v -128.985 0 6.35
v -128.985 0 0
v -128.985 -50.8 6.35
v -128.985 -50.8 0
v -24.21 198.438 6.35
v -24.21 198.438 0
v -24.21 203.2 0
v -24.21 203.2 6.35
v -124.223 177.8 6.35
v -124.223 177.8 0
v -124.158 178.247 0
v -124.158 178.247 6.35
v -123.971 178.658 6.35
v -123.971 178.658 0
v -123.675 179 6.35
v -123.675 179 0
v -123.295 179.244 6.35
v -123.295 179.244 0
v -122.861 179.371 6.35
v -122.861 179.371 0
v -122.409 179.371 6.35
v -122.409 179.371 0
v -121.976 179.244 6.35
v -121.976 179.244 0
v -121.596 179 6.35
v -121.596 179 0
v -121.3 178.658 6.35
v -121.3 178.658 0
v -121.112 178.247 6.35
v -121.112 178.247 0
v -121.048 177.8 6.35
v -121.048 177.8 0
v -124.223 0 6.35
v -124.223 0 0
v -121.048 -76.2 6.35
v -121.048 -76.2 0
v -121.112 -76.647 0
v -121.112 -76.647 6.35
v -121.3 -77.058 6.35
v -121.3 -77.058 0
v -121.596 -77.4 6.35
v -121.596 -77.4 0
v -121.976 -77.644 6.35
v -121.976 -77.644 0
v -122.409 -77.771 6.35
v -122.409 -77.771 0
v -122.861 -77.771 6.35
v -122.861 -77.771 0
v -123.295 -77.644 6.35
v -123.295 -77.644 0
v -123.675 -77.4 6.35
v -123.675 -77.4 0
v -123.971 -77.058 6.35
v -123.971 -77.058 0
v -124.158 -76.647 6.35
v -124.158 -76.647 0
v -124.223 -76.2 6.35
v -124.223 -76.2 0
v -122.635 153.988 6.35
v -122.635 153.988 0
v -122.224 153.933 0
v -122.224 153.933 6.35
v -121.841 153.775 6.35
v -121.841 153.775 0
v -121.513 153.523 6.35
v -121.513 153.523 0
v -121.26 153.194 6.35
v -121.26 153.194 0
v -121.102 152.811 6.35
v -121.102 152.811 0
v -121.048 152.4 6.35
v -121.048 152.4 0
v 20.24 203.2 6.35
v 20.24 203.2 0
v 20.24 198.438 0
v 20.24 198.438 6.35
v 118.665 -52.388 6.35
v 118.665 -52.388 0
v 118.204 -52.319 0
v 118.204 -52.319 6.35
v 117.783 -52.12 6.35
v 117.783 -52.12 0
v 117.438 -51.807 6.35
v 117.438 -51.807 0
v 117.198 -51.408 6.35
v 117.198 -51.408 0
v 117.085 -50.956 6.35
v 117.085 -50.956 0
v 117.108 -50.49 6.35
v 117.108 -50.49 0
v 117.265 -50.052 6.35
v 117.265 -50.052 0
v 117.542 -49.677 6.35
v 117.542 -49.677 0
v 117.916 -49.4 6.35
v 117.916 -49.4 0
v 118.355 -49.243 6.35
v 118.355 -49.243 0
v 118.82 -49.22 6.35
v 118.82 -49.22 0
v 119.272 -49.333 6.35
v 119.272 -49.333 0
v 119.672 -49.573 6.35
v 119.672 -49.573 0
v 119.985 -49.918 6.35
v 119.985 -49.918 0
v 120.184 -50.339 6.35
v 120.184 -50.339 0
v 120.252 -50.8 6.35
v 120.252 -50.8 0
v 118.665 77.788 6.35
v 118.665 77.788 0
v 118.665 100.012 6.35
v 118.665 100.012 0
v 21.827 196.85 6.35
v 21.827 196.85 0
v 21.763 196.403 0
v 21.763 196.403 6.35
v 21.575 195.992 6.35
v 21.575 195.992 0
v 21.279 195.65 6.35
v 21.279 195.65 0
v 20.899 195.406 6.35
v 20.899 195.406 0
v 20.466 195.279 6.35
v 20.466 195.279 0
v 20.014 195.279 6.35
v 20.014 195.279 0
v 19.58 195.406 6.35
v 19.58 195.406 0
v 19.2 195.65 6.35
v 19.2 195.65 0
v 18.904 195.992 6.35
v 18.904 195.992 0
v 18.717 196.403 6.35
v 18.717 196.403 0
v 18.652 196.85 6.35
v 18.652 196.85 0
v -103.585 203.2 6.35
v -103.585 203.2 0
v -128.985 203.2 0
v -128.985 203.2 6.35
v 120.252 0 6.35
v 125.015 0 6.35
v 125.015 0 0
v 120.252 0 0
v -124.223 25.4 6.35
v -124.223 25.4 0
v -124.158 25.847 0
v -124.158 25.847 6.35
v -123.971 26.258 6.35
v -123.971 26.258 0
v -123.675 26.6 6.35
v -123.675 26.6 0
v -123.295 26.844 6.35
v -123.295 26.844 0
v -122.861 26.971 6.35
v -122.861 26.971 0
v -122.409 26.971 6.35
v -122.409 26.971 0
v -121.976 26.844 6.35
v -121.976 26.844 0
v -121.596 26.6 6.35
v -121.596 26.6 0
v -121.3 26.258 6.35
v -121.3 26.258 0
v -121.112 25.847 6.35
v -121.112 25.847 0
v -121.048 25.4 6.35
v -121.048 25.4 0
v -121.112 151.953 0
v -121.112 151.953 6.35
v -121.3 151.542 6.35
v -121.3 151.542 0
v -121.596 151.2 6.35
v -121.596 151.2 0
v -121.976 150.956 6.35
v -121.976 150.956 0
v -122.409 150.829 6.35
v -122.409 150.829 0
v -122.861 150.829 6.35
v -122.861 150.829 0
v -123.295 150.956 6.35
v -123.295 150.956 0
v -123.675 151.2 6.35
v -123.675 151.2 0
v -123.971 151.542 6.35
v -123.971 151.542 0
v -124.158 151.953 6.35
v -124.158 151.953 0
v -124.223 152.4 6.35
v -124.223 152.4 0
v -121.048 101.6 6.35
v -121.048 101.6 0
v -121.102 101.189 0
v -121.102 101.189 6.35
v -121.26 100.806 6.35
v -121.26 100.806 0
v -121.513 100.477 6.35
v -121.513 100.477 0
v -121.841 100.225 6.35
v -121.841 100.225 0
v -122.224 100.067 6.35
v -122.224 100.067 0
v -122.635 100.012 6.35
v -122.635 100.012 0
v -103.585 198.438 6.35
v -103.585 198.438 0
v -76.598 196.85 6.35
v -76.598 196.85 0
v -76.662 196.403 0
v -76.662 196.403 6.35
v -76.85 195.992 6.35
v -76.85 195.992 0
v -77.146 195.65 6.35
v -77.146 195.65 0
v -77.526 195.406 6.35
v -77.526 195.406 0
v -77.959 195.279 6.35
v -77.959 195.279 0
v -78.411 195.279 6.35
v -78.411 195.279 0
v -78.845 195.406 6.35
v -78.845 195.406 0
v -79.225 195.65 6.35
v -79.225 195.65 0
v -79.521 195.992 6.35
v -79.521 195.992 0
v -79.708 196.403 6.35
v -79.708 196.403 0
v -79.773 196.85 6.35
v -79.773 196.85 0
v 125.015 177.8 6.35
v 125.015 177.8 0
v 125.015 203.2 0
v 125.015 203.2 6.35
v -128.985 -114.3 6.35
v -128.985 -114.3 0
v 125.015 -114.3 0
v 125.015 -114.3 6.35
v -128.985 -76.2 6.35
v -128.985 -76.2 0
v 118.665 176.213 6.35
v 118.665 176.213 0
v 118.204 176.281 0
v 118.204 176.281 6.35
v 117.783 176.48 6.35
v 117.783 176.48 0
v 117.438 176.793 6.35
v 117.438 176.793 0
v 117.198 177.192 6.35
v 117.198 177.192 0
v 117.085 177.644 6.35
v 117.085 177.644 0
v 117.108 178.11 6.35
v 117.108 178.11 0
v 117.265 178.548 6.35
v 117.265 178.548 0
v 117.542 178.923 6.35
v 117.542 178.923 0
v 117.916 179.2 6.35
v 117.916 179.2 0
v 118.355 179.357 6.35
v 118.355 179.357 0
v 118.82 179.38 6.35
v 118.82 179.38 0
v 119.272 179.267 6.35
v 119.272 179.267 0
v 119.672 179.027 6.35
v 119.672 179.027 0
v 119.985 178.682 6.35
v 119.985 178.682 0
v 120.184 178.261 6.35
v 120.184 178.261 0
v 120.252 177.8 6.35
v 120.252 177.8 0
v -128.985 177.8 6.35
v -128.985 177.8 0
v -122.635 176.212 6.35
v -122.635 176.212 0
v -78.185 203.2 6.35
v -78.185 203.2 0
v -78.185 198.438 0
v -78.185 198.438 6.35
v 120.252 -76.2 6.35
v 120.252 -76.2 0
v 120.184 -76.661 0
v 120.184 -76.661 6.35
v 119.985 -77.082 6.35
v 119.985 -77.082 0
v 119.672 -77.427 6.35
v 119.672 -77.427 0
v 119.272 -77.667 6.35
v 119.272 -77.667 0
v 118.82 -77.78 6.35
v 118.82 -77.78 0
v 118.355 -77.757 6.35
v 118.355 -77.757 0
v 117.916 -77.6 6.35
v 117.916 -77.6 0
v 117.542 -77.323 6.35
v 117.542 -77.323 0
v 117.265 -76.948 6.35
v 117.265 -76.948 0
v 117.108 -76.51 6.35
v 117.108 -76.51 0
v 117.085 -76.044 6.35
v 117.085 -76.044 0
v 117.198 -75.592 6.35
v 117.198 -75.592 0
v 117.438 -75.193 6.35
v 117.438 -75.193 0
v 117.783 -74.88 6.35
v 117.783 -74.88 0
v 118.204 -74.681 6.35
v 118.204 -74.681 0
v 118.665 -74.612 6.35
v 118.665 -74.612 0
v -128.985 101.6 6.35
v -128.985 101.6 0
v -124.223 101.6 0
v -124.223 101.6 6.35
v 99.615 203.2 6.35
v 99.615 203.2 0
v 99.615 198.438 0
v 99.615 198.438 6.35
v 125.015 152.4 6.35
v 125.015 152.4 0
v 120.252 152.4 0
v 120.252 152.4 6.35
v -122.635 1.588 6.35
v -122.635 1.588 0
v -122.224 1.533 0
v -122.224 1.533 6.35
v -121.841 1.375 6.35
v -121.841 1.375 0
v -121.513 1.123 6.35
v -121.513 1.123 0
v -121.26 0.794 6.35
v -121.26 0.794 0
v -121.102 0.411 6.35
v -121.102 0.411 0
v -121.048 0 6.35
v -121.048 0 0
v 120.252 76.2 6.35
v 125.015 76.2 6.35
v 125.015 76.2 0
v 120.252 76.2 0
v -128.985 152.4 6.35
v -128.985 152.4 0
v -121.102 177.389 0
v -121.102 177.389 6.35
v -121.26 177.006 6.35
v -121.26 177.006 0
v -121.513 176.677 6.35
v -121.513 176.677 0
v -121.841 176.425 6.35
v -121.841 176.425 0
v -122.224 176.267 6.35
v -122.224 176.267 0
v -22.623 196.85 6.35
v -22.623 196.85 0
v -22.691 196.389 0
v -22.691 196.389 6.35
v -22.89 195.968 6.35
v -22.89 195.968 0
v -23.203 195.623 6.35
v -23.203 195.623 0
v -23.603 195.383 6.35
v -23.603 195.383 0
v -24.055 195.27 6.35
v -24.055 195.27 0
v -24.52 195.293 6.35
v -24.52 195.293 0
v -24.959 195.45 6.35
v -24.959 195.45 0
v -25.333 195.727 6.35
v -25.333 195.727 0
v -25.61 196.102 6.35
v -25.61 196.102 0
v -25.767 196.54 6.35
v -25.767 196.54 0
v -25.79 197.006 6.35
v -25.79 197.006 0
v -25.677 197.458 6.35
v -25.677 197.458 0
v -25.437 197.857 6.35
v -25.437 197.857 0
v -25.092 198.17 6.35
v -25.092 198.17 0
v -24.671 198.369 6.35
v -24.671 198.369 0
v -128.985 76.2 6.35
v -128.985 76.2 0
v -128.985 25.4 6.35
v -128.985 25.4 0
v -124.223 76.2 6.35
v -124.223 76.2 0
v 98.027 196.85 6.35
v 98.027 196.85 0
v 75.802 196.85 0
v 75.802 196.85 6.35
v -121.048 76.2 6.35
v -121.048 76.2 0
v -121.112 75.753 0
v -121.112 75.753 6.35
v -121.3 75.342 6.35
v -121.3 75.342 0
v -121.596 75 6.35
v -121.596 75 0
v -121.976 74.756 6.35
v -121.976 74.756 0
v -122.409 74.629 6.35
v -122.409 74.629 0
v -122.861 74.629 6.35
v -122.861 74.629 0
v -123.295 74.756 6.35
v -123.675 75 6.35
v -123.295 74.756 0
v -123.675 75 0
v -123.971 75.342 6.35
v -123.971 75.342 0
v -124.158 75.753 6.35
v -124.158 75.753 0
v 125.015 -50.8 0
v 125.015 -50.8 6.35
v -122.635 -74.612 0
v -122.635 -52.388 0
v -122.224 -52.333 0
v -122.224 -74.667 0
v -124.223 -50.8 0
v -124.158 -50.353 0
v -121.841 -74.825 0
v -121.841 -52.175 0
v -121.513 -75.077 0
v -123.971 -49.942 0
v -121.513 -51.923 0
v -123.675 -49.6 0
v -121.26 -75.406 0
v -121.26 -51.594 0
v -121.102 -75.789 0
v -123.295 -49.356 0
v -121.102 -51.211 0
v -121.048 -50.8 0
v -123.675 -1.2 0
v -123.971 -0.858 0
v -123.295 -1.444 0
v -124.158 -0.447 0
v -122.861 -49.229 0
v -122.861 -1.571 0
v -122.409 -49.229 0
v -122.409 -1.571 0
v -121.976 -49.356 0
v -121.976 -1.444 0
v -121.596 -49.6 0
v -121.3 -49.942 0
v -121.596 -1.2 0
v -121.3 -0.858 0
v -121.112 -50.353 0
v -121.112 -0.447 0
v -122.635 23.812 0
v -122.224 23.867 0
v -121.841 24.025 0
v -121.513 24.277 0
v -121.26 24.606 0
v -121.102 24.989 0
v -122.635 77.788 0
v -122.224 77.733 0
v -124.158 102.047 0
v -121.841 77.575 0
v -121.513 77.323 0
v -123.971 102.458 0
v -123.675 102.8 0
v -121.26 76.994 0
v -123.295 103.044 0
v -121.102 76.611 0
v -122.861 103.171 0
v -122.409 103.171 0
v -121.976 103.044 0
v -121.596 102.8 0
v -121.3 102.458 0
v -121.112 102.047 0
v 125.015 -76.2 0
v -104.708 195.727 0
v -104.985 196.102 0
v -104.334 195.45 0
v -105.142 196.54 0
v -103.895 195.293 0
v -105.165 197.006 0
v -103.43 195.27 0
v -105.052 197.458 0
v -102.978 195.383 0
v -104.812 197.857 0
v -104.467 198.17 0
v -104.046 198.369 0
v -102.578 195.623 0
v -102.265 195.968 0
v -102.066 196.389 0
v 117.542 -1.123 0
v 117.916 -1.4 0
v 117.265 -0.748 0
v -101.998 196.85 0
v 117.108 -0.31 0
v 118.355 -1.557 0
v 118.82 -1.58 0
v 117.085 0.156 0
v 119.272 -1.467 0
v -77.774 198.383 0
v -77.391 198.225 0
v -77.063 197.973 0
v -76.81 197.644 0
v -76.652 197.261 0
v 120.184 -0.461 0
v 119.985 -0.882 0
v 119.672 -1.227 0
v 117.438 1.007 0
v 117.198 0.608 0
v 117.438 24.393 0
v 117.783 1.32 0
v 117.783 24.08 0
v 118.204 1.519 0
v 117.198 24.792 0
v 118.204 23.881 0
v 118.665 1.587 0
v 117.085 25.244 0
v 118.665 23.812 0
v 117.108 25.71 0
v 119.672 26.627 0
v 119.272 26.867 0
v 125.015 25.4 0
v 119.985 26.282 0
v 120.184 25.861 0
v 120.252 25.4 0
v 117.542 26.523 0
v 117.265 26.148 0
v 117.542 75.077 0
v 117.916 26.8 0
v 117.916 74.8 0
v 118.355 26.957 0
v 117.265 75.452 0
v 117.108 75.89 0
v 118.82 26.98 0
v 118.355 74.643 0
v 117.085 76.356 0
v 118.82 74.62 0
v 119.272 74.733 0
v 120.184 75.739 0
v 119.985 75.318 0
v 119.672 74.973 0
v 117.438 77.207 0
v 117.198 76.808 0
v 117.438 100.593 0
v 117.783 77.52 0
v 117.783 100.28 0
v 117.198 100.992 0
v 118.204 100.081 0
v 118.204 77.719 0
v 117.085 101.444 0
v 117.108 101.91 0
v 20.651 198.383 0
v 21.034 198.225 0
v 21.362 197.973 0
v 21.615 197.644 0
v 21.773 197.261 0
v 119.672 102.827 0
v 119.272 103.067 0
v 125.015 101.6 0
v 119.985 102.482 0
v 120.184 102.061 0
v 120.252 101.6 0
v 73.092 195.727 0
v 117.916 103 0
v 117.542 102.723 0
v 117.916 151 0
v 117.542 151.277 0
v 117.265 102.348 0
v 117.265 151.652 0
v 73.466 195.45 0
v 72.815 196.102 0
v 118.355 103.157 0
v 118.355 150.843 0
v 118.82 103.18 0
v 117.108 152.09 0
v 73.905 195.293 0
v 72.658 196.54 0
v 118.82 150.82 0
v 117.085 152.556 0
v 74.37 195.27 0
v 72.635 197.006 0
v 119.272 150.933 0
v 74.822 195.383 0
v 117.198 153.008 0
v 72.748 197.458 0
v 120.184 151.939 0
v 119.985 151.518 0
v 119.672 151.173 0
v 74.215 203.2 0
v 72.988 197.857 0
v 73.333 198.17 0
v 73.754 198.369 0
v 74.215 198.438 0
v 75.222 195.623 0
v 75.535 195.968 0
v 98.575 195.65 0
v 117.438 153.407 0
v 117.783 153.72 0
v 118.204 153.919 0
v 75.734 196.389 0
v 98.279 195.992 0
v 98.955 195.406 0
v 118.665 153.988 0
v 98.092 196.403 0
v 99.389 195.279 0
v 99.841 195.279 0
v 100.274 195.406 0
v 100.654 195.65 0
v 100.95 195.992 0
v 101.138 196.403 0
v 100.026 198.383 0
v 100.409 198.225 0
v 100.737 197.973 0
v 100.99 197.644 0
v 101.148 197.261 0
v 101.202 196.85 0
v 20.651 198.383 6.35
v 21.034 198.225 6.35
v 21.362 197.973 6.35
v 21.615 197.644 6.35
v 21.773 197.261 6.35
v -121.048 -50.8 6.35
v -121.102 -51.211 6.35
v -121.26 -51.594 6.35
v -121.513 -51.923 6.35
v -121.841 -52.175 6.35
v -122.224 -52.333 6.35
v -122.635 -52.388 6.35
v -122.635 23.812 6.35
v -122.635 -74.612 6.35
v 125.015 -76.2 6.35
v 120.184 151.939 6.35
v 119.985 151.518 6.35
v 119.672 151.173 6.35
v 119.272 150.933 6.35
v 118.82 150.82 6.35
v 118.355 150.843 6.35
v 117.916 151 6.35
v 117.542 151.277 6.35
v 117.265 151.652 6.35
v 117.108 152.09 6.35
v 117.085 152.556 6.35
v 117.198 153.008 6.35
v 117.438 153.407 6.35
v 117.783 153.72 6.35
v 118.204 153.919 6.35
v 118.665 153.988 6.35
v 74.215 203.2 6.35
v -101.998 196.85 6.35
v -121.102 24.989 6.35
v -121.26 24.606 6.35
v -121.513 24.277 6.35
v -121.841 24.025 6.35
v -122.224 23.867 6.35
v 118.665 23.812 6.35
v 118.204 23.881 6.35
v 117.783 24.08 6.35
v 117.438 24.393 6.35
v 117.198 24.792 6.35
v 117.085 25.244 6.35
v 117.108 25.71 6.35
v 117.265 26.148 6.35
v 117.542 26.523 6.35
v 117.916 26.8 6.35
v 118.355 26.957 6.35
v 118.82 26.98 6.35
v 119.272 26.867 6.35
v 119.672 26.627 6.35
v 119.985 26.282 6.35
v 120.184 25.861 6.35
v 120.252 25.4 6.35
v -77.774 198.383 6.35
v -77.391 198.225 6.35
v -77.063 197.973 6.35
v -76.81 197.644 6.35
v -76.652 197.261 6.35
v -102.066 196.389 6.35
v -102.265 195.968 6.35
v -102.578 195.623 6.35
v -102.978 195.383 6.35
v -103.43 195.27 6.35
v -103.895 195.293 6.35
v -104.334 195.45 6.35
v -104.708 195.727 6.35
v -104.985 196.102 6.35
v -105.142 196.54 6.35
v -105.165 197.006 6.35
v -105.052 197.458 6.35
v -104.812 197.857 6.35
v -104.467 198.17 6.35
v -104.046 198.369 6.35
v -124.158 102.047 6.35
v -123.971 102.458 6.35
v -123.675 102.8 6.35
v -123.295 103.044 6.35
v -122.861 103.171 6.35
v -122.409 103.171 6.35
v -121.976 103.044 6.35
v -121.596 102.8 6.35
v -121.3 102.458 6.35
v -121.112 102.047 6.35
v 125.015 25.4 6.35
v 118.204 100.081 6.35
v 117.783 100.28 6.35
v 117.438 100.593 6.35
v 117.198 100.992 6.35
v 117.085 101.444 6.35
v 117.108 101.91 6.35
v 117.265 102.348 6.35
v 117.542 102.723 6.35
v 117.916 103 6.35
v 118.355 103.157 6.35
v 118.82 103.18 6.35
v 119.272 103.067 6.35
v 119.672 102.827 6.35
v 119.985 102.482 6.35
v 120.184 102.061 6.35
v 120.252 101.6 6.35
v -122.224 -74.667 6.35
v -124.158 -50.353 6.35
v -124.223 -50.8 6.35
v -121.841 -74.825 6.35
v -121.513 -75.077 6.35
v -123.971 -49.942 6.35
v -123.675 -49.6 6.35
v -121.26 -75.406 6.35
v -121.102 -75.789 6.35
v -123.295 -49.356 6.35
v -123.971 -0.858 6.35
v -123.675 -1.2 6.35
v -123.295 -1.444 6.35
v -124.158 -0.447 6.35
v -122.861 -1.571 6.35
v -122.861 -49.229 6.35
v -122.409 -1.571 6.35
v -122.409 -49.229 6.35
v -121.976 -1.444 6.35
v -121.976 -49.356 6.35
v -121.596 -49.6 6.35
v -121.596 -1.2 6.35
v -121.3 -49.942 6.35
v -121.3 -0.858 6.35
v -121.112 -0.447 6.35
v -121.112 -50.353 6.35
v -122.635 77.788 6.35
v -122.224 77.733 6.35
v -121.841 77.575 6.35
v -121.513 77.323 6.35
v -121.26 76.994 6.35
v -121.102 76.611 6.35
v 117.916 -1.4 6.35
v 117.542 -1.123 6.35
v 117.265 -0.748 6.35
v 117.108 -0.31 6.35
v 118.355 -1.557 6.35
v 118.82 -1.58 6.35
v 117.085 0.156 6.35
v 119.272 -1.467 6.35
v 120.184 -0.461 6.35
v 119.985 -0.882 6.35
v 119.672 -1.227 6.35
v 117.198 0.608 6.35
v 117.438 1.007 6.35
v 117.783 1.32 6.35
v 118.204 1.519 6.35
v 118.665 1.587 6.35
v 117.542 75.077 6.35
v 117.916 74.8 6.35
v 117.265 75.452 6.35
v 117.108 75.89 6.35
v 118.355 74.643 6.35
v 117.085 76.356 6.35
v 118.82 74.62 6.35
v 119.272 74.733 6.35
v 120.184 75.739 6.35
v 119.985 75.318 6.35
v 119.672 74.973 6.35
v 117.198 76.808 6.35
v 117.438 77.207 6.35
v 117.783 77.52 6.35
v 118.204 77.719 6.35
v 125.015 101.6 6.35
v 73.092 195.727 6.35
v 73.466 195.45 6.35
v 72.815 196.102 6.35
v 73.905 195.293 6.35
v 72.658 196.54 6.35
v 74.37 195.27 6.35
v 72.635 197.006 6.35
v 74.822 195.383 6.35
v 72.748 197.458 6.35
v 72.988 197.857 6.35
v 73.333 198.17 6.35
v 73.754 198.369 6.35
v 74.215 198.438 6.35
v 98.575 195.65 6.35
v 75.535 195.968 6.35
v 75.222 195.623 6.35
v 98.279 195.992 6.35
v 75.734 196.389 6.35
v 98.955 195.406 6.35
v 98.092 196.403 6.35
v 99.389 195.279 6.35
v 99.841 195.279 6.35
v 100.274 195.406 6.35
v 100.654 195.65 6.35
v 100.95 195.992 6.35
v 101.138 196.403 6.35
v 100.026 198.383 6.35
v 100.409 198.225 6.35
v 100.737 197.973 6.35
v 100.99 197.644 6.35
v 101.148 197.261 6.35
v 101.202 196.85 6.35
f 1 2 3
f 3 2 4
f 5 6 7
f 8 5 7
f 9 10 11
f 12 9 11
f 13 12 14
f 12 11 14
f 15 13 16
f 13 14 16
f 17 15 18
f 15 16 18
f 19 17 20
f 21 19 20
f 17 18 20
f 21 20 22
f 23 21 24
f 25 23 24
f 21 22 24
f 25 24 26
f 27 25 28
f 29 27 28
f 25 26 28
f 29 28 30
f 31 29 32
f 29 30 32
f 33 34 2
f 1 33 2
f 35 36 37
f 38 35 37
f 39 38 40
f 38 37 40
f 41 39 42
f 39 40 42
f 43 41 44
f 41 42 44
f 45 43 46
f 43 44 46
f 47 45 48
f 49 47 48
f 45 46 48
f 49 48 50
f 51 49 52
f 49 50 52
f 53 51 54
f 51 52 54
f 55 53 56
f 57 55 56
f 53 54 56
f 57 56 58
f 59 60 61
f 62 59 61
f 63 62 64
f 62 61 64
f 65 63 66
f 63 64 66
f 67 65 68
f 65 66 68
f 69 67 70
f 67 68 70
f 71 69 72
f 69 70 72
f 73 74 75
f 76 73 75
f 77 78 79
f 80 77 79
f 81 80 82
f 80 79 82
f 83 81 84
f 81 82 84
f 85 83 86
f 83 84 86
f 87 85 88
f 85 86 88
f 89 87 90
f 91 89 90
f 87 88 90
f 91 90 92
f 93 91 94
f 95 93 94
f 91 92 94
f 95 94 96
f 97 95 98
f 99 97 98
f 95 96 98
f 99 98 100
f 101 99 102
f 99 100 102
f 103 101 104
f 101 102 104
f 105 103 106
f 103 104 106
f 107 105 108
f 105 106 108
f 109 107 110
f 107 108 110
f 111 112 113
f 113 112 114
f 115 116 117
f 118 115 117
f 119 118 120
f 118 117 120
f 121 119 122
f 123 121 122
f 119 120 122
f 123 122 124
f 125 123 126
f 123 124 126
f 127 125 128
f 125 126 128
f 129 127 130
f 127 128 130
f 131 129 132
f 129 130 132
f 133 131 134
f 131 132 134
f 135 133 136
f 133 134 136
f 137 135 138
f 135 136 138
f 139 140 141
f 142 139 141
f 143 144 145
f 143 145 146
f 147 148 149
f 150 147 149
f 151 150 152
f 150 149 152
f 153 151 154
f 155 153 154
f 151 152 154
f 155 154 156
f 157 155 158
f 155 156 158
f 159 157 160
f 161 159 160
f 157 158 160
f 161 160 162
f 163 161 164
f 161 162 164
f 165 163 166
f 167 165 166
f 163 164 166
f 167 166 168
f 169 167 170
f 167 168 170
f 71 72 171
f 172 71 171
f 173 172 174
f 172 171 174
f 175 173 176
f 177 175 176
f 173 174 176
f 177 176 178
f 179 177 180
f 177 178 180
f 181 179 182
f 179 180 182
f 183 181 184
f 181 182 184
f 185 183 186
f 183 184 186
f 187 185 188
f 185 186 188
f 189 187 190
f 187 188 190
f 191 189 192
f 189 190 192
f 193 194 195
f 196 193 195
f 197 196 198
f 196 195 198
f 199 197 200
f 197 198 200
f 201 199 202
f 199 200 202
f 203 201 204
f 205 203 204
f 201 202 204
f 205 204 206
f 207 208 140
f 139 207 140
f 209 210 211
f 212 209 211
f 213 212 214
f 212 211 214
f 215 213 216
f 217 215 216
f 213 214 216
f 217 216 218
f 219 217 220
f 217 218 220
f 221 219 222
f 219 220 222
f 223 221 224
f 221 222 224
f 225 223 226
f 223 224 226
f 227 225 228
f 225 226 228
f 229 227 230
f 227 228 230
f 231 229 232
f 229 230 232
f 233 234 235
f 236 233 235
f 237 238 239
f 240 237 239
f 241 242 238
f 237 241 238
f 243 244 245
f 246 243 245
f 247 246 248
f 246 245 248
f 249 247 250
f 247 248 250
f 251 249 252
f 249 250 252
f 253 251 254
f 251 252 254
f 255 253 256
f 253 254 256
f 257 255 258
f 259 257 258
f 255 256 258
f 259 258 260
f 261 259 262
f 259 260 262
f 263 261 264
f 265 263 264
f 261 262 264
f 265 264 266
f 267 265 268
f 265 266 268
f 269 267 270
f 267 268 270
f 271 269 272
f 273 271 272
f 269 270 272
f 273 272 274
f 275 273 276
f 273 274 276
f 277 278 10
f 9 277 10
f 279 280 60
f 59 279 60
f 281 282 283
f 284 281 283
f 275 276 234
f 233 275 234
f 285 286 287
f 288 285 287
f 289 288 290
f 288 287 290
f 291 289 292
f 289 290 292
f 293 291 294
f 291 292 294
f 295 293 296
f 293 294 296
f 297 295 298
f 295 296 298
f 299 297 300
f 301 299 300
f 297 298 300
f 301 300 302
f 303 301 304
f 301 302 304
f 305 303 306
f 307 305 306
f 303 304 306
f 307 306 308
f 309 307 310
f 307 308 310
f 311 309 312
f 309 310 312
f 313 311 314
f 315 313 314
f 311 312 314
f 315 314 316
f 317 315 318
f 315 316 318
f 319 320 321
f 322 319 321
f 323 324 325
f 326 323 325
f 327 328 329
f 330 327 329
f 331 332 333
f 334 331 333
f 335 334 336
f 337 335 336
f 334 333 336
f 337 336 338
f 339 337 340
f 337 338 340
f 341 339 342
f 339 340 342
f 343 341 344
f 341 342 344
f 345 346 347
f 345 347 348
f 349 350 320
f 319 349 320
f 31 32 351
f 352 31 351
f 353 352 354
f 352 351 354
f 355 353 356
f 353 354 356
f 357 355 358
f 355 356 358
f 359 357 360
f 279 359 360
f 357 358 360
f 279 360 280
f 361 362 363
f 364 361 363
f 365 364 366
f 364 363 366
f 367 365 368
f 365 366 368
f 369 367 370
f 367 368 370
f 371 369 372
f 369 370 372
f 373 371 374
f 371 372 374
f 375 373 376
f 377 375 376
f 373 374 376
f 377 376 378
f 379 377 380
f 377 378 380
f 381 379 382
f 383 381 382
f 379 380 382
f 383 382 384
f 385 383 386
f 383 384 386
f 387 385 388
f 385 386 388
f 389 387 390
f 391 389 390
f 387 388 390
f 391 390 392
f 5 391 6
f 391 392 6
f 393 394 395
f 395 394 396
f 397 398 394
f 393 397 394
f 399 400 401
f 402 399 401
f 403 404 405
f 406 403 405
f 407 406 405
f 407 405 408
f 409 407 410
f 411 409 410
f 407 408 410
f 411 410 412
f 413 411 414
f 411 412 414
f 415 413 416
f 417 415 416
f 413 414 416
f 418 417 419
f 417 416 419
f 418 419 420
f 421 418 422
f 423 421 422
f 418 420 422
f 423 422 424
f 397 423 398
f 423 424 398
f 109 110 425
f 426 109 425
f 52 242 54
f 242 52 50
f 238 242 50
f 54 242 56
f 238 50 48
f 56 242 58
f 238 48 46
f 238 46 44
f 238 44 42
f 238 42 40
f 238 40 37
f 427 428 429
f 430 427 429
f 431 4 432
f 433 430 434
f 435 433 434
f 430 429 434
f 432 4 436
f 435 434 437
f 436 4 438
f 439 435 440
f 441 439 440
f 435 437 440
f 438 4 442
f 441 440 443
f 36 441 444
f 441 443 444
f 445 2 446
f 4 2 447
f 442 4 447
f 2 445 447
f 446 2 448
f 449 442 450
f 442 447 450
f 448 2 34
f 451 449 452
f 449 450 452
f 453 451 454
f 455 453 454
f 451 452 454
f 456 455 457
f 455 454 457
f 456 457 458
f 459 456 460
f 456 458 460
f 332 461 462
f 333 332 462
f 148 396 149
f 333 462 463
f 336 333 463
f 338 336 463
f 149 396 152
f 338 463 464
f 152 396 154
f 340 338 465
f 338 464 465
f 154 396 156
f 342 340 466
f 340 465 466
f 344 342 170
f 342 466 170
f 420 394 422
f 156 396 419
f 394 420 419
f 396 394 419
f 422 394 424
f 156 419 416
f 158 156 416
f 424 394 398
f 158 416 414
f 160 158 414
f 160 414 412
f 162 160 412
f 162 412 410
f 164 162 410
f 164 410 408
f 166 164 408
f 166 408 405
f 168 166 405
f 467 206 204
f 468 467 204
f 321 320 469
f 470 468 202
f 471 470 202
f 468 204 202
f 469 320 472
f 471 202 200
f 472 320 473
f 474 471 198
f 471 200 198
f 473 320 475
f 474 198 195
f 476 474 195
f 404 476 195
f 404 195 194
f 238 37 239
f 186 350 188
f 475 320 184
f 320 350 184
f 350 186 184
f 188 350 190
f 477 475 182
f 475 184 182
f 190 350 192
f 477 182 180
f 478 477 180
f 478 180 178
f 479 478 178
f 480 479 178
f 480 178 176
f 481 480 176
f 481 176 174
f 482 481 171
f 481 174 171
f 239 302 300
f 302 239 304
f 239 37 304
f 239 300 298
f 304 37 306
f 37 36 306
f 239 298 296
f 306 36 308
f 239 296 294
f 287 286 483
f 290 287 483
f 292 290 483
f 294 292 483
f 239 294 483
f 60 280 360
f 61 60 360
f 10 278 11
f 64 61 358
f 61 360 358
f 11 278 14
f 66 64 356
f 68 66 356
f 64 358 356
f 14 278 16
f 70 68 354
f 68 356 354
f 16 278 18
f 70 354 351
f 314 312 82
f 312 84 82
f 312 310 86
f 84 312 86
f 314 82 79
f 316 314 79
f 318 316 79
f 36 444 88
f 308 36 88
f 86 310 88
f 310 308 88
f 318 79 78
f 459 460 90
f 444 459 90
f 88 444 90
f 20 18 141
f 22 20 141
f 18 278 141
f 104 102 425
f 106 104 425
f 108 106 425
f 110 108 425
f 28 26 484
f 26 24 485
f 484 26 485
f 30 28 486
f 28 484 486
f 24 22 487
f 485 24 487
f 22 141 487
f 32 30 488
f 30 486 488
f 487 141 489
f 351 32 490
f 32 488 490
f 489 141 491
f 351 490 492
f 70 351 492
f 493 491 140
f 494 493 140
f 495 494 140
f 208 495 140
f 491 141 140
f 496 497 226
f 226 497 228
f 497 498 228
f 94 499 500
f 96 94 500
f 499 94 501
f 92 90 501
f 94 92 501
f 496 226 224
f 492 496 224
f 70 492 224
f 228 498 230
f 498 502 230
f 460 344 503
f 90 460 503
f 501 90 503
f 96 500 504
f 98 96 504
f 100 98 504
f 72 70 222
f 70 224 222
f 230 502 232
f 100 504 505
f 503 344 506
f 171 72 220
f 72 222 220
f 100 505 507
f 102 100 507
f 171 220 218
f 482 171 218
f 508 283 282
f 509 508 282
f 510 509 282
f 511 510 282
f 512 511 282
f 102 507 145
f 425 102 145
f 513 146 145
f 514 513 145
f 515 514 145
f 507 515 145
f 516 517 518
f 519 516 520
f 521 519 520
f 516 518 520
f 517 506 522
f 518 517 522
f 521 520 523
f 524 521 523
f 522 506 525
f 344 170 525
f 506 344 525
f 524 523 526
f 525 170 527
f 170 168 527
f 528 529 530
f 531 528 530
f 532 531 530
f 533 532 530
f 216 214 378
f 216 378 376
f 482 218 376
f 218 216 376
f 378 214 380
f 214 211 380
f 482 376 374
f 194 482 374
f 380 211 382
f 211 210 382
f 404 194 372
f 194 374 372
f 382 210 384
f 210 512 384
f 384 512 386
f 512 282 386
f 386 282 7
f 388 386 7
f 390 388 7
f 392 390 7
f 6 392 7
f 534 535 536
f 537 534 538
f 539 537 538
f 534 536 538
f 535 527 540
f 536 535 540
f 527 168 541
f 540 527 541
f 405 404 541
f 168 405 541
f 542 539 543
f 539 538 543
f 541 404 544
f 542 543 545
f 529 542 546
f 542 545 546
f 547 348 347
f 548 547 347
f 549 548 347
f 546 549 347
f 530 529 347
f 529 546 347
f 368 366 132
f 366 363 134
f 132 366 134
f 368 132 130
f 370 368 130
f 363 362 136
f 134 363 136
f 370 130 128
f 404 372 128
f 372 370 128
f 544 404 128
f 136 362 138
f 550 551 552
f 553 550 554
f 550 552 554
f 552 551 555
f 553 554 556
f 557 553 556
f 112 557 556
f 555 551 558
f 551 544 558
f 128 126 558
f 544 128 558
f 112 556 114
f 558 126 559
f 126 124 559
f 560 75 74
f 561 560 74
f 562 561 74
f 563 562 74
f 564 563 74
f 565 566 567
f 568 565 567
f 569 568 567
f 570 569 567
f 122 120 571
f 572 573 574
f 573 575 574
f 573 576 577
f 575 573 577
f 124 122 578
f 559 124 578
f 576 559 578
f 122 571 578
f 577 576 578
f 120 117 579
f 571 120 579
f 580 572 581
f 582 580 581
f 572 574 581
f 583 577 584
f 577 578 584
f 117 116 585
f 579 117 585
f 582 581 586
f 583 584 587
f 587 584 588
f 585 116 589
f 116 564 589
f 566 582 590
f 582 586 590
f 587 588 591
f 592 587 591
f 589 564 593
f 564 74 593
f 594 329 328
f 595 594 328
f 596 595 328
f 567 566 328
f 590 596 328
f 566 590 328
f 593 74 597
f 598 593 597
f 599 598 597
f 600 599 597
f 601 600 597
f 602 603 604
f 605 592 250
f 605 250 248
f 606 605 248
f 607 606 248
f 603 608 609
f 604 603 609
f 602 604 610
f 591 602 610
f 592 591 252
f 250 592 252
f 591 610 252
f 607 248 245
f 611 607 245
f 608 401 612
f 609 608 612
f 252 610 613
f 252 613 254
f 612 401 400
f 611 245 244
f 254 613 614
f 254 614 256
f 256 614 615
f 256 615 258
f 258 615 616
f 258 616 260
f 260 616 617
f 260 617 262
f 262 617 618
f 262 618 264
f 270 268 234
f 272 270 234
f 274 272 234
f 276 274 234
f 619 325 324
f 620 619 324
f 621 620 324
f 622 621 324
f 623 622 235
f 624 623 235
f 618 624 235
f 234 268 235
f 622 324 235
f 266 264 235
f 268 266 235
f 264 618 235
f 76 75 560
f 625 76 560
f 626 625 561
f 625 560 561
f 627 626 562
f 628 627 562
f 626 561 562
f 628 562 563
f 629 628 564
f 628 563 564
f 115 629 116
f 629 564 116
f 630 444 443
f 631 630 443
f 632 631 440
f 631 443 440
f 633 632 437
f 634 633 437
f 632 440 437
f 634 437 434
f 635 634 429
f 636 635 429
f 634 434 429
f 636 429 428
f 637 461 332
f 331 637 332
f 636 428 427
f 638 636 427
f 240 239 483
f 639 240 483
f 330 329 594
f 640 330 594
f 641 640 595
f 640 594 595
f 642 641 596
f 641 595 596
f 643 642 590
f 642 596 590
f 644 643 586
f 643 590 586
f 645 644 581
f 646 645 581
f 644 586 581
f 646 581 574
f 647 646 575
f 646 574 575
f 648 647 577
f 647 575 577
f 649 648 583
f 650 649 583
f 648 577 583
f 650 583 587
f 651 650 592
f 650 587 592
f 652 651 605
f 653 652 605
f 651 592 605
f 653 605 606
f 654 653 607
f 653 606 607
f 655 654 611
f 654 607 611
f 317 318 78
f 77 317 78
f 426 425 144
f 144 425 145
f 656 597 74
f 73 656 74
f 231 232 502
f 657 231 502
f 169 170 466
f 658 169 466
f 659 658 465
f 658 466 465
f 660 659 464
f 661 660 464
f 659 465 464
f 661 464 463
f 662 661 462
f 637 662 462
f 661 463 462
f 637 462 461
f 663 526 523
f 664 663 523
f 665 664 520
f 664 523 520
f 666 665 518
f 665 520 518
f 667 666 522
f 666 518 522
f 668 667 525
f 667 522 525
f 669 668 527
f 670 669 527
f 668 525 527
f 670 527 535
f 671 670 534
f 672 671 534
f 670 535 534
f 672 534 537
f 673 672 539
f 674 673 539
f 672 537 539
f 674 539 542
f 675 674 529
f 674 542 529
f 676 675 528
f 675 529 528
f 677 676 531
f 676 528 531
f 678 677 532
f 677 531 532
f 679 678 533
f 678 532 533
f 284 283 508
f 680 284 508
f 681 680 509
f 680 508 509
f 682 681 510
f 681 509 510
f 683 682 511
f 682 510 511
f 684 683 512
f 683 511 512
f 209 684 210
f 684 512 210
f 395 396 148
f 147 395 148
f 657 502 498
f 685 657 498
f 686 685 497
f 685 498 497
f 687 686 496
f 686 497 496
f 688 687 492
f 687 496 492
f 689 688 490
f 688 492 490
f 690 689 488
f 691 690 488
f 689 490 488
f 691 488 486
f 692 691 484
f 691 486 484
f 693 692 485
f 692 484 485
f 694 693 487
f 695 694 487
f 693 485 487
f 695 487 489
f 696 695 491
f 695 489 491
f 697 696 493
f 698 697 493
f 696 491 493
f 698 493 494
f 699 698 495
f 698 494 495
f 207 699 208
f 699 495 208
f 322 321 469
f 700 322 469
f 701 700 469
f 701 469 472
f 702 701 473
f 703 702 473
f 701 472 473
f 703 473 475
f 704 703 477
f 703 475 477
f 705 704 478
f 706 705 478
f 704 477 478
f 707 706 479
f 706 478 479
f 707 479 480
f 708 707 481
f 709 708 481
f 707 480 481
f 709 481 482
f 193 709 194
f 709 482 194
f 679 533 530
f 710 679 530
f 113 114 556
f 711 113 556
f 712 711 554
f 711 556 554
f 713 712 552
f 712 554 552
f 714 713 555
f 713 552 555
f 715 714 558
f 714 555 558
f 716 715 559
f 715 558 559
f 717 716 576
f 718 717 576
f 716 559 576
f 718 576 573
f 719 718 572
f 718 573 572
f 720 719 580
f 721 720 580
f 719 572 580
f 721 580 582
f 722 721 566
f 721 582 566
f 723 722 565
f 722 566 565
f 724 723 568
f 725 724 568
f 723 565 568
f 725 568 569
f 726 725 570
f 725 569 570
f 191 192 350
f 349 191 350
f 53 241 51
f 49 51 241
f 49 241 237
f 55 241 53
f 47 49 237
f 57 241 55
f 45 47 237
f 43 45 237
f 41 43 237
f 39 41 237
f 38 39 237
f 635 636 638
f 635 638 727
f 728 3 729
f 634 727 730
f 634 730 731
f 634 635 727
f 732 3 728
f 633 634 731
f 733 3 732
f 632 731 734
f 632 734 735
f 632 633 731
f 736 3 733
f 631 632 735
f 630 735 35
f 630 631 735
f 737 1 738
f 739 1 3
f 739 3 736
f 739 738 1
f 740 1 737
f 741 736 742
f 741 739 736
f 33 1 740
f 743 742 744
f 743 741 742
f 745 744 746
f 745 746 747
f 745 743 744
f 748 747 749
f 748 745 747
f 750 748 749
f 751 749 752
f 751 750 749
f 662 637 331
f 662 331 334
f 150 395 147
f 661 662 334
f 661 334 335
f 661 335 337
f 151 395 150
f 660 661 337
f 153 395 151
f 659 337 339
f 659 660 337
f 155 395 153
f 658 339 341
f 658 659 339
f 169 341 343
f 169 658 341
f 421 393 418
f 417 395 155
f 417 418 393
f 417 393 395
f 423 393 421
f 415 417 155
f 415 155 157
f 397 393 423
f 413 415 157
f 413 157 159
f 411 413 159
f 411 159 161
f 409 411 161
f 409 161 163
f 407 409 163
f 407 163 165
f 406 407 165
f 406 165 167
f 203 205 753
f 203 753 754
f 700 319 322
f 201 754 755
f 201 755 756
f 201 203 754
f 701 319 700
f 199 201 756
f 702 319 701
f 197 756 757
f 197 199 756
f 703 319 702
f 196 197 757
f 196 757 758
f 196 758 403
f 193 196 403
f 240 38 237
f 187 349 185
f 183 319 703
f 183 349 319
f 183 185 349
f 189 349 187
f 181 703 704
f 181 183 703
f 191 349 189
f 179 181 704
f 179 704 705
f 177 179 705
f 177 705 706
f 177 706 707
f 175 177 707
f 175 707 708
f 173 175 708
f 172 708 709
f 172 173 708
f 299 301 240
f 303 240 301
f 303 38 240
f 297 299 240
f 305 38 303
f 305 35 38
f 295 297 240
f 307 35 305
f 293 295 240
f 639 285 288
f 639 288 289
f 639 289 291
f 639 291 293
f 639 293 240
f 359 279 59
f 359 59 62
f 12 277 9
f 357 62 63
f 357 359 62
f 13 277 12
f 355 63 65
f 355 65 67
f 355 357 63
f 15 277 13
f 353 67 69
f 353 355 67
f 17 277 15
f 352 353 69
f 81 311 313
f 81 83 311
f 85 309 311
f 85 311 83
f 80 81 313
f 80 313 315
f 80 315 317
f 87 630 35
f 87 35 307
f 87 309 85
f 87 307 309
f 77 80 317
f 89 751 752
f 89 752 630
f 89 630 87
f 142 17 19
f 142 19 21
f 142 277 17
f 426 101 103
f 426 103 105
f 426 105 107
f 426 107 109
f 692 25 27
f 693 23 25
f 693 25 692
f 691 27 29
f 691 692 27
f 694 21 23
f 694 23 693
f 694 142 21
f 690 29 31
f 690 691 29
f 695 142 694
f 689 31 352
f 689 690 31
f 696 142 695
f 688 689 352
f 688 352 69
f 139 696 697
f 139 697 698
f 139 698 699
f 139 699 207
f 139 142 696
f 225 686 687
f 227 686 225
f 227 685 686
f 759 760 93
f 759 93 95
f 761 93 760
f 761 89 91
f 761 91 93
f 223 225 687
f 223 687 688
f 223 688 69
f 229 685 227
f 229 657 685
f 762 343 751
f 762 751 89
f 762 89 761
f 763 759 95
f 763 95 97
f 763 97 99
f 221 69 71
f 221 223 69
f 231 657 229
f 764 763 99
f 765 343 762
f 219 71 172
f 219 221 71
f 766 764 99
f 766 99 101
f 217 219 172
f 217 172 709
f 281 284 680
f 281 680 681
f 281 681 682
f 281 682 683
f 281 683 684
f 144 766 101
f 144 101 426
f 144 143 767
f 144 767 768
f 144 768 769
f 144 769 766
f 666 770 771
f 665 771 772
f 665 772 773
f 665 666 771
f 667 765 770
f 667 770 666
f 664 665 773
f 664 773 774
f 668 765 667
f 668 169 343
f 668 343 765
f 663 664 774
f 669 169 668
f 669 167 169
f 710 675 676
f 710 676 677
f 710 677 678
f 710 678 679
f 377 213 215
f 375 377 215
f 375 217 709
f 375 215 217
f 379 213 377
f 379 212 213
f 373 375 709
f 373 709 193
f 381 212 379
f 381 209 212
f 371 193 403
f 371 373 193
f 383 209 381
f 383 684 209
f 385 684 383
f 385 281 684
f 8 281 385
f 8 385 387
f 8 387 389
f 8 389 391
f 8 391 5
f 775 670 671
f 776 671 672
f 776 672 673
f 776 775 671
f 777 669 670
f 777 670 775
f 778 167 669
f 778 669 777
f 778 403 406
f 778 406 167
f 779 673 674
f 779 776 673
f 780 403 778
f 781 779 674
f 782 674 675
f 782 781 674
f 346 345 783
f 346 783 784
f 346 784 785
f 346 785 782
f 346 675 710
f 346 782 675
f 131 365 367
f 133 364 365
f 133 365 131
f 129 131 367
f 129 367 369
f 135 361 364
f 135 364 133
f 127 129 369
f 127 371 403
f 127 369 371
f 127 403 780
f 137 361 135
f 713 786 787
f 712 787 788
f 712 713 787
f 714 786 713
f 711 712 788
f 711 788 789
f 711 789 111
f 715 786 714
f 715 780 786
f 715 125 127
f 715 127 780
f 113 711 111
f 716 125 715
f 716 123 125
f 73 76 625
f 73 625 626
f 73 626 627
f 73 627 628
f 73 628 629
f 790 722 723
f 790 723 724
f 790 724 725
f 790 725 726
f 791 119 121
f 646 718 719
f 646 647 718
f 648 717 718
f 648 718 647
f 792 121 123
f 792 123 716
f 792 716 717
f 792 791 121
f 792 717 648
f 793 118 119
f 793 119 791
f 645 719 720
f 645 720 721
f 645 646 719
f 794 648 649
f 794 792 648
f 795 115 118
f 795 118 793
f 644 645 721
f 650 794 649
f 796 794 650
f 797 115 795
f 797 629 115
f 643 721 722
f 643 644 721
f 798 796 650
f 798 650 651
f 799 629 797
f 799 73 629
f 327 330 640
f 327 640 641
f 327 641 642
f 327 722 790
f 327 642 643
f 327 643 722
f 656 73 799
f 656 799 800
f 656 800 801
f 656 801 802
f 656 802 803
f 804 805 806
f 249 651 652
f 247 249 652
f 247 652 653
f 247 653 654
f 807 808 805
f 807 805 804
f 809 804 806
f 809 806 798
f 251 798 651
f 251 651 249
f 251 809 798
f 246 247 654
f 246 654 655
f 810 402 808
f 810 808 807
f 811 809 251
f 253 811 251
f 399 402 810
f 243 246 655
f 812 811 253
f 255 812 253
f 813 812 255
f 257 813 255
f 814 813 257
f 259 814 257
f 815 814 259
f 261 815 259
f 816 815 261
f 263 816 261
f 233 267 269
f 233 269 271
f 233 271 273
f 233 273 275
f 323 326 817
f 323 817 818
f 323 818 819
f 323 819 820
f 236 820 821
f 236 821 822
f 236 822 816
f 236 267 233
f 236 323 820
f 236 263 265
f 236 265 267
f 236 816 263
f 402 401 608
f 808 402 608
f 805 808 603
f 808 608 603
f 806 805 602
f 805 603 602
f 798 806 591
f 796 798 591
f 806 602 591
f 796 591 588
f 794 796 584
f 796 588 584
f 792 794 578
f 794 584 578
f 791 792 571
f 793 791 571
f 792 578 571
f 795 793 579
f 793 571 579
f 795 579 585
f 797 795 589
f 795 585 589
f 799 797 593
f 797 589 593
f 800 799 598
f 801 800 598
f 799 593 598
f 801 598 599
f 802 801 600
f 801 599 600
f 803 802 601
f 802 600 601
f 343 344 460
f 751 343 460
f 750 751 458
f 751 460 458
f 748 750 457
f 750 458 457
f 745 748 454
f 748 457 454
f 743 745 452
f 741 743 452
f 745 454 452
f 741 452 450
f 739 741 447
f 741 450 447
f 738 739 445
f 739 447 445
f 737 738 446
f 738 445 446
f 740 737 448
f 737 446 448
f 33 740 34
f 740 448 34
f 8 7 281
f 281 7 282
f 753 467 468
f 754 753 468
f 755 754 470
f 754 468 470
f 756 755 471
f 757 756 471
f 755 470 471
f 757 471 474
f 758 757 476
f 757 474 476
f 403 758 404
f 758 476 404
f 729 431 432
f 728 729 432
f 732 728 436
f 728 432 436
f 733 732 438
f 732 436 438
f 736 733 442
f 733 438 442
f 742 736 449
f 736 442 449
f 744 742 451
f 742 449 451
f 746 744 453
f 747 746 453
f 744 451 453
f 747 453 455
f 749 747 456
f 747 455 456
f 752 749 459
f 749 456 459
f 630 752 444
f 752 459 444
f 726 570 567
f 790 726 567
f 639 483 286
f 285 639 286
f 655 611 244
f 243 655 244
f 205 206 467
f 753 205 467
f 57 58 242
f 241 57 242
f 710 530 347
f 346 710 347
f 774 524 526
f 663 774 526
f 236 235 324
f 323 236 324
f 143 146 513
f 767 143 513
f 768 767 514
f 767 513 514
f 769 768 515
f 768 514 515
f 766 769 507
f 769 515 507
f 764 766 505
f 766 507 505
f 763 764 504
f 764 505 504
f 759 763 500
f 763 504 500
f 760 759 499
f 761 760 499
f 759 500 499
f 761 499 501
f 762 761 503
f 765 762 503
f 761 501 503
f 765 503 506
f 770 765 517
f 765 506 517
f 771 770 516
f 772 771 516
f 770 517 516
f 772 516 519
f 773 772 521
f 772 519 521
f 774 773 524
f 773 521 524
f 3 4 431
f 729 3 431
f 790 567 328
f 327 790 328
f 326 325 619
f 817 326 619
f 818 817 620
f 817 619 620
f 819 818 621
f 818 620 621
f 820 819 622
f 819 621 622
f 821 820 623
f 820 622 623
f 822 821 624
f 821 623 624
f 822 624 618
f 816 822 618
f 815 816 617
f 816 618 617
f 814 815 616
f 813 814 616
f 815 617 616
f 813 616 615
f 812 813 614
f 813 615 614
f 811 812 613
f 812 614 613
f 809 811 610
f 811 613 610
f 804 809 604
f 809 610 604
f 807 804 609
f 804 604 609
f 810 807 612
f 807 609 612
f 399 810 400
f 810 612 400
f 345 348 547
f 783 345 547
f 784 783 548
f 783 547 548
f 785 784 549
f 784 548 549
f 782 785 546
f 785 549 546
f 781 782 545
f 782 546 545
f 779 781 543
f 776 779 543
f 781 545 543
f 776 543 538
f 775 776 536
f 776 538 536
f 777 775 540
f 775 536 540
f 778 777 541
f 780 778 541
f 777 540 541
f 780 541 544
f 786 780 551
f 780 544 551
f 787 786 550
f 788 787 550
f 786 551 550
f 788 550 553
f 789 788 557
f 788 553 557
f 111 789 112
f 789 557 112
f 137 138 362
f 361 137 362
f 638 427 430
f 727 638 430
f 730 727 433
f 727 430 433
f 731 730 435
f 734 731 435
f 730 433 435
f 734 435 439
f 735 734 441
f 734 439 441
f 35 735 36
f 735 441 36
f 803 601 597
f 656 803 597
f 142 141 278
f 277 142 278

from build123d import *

# Parameters (mm, degrees)
F1_DEPTH = 6.35


with BuildPart() as f1:
    # F0 (on Top) → F1 (new body)
    with BuildSketch(Plane.XY):
        with BuildLine():
            Line((-103.585208, 203.2), (-128.985208, 203.2))
            Line((-128.985208, 203.2), (-128.985208, 177.8))
            Line((-128.985208, 177.8), (-124.222708, 177.8))
            ThreePointArc((-124.222708, 177.8), (-122.635208, 179.3875), (-121.047708, 177.8))
            ThreePointArc((-121.047708, 177.8), (-121.512676, 176.677468), (-122.635208, 176.2125))
            Line((-122.635208, 176.2125), (-122.635208, 153.9875))
            ThreePointArc((-122.635208, 153.9875), (-121.512676, 153.522532), (-121.047708, 152.4))
            ThreePointArc((-121.047708, 152.4), (-122.635208, 150.8125), (-124.222708, 152.4))
            Line((-124.222708, 152.4), (-128.985208, 152.4))
            Line((-128.985208, 152.4), (-128.985208, 101.6))
            Line((-128.985208, 101.6), (-124.222708, 101.6))
            ThreePointArc((-124.222708, 101.6), (-122.635208, 103.1875), (-121.047708, 101.6))
            ThreePointArc((-121.047708, 101.6), (-121.512676, 100.477468), (-122.635208, 100.0125))
            Line((-122.635208, 100.0125), (-122.635208, 77.7875))
            ThreePointArc((-122.635208, 77.7875), (-121.512676, 77.322532), (-121.047708, 76.2))
            ThreePointArc((-121.047708, 76.2), (-122.635208, 74.6125), (-124.222708, 76.2))
            Line((-124.222708, 76.2), (-128.985208, 76.2))
            Line((-128.985208, 76.2), (-128.985208, 25.4))
            Line((-128.985208, 25.4), (-124.222708, 25.4))
            ThreePointArc((-124.222708, 25.4), (-122.635208, 26.9875), (-121.047708, 25.4))
            ThreePointArc((-121.047708, 25.4), (-121.512676, 24.277468), (-122.635208, 23.8125))
            Line((-122.635208, 23.8125), (-122.635208, 1.5875))
            ThreePointArc((-122.635208, 1.5875), (-121.512676, 1.122532), (-121.047708, 0))
            ThreePointArc((-121.047708, 0), (-122.635208, -1.5875), (-124.222708, 0))
            Line((-124.222708, 0), (-128.985208, 0))
            Line((-128.985208, 0), (-128.985208, -50.8))
            Line((-128.985208, -50.8), (-124.222708, -50.8))
            ThreePointArc((-124.222708, -50.8), (-122.635208, -49.2125), (-121.047708, -50.8))
            ThreePointArc((-121.047708, -50.8), (-121.512676, -51.922532), (-122.635208, -52.3875))
            Line((-122.635208, -52.3875), (-122.635208, -74.6125))
            ThreePointArc((-122.635208, -74.6125), (-121.512676, -75.077468), (-121.047708, -76.2))
            ThreePointArc((-121.047708, -76.2), (-122.635208, -77.7875), (-124.222708, -76.2))
            Line((-124.222708, -76.2), (-128.985208, -76.2))
            Line((-128.985208, -76.2), (-128.985208, -114.3))
            Line((-128.985208, -114.3), (125.014792, -114.3))
            Line((125.014792, -114.3), (125.014792, -76.2))
            Line((125.014792, -76.2), (120.252292, -76.2))
            ThreePointArc((120.252292, -76.2), (117.54226, -77.322532), (118.664792, -74.6125))
            Line((118.664792, -74.6125), (118.664792, -52.3875))
            ThreePointArc((118.664792, -52.3875), (117.54226, -49.677468), (120.252292, -50.8))
            Line((120.252292, -50.8), (125.014792, -50.8))
            Line((125.014792, -50.8), (125.014792, 0))
            Line((125.014792, 0), (120.252292, 0))
            ThreePointArc((120.252292, 0), (117.54226, -1.122532), (118.664792, 1.5875))
            Line((118.664792, 1.5875), (118.664792, 23.8125))
            ThreePointArc((118.664792, 23.8125), (117.54226, 26.522532), (120.252292, 25.4))
            Line((120.252292, 25.4), (125.014792, 25.4))
            Line((125.014792, 25.4), (125.014792, 76.2))
            Line((125.014792, 76.2), (120.252292, 76.2))
            ThreePointArc((120.252292, 76.2), (117.54226, 75.077468), (118.664792, 77.7875))
            Line((118.664792, 77.7875), (118.664792, 100.0125))
            ThreePointArc((118.664792, 100.0125), (117.54226, 102.722532), (120.252292, 101.6))
            Line((120.252292, 101.6), (125.014792, 101.6))
            Line((125.014792, 101.6), (125.014792, 152.4))
            Line((125.014792, 152.4), (120.252292, 152.4))
            ThreePointArc((120.252292, 152.4), (117.54226, 151.277468), (118.664792, 153.9875))
            Line((118.664792, 153.9875), (118.664792, 176.2125))
            ThreePointArc((118.664792, 176.2125), (117.54226, 178.922532), (120.252292, 177.8))
            Line((120.252292, 177.8), (125.014792, 177.8))
            Line((125.014792, 177.8), (125.014792, 203.2))
            Line((125.014792, 203.2), (99.614792, 203.2))
            Line((99.614792, 203.2), (99.614792, 198.4375))
            ThreePointArc((99.614792, 198.4375), (100.737324, 197.972532), (101.202292, 196.85))
            ThreePointArc((101.202292, 196.85), (99.614792, 195.2625), (98.027292, 196.85))
            Line((98.027292, 196.85), (75.802292, 196.85))
            ThreePointArc((75.802292, 196.85), (73.09226, 195.727468), (74.214792, 198.4375))
            Line((74.214792, 198.4375), (74.214792, 203.2))
            Line((74.214792, 203.2), (20.239792, 203.2))
            Line((20.239792, 203.2), (20.239792, 198.4375))
            ThreePointArc((20.239792, 198.4375), (21.362324, 197.972532), (21.827292, 196.85))
            ThreePointArc((21.827292, 196.85), (20.239792, 195.2625), (18.652292, 196.85))
            Line((18.652292, 196.85), (-22.622708, 196.85))
            ThreePointArc((-22.622708, 196.85), (-25.33274, 195.727468), (-24.210208, 198.4375))
            Line((-24.210208, 198.4375), (-24.210208, 203.2))
            Line((-24.210208, 203.2), (-78.185208, 203.2))
            Line((-78.185208, 203.2), (-78.185208, 198.4375))
            ThreePointArc((-78.185208, 198.4375), (-77.062676, 197.972532), (-76.597708, 196.85))
            ThreePointArc((-76.597708, 196.85), (-78.185208, 195.2625), (-79.772708, 196.85))
            Line((-79.772708, 196.85), (-101.997708, 196.85))
            ThreePointArc((-101.997708, 196.85), (-104.70774, 195.727468), (-103.585208, 198.4375))
            Line((-103.585208, 198.4375), (-103.585208, 203.2))
        make_face()
    extrude(amount=F1_DEPTH)


solid = f1.part
